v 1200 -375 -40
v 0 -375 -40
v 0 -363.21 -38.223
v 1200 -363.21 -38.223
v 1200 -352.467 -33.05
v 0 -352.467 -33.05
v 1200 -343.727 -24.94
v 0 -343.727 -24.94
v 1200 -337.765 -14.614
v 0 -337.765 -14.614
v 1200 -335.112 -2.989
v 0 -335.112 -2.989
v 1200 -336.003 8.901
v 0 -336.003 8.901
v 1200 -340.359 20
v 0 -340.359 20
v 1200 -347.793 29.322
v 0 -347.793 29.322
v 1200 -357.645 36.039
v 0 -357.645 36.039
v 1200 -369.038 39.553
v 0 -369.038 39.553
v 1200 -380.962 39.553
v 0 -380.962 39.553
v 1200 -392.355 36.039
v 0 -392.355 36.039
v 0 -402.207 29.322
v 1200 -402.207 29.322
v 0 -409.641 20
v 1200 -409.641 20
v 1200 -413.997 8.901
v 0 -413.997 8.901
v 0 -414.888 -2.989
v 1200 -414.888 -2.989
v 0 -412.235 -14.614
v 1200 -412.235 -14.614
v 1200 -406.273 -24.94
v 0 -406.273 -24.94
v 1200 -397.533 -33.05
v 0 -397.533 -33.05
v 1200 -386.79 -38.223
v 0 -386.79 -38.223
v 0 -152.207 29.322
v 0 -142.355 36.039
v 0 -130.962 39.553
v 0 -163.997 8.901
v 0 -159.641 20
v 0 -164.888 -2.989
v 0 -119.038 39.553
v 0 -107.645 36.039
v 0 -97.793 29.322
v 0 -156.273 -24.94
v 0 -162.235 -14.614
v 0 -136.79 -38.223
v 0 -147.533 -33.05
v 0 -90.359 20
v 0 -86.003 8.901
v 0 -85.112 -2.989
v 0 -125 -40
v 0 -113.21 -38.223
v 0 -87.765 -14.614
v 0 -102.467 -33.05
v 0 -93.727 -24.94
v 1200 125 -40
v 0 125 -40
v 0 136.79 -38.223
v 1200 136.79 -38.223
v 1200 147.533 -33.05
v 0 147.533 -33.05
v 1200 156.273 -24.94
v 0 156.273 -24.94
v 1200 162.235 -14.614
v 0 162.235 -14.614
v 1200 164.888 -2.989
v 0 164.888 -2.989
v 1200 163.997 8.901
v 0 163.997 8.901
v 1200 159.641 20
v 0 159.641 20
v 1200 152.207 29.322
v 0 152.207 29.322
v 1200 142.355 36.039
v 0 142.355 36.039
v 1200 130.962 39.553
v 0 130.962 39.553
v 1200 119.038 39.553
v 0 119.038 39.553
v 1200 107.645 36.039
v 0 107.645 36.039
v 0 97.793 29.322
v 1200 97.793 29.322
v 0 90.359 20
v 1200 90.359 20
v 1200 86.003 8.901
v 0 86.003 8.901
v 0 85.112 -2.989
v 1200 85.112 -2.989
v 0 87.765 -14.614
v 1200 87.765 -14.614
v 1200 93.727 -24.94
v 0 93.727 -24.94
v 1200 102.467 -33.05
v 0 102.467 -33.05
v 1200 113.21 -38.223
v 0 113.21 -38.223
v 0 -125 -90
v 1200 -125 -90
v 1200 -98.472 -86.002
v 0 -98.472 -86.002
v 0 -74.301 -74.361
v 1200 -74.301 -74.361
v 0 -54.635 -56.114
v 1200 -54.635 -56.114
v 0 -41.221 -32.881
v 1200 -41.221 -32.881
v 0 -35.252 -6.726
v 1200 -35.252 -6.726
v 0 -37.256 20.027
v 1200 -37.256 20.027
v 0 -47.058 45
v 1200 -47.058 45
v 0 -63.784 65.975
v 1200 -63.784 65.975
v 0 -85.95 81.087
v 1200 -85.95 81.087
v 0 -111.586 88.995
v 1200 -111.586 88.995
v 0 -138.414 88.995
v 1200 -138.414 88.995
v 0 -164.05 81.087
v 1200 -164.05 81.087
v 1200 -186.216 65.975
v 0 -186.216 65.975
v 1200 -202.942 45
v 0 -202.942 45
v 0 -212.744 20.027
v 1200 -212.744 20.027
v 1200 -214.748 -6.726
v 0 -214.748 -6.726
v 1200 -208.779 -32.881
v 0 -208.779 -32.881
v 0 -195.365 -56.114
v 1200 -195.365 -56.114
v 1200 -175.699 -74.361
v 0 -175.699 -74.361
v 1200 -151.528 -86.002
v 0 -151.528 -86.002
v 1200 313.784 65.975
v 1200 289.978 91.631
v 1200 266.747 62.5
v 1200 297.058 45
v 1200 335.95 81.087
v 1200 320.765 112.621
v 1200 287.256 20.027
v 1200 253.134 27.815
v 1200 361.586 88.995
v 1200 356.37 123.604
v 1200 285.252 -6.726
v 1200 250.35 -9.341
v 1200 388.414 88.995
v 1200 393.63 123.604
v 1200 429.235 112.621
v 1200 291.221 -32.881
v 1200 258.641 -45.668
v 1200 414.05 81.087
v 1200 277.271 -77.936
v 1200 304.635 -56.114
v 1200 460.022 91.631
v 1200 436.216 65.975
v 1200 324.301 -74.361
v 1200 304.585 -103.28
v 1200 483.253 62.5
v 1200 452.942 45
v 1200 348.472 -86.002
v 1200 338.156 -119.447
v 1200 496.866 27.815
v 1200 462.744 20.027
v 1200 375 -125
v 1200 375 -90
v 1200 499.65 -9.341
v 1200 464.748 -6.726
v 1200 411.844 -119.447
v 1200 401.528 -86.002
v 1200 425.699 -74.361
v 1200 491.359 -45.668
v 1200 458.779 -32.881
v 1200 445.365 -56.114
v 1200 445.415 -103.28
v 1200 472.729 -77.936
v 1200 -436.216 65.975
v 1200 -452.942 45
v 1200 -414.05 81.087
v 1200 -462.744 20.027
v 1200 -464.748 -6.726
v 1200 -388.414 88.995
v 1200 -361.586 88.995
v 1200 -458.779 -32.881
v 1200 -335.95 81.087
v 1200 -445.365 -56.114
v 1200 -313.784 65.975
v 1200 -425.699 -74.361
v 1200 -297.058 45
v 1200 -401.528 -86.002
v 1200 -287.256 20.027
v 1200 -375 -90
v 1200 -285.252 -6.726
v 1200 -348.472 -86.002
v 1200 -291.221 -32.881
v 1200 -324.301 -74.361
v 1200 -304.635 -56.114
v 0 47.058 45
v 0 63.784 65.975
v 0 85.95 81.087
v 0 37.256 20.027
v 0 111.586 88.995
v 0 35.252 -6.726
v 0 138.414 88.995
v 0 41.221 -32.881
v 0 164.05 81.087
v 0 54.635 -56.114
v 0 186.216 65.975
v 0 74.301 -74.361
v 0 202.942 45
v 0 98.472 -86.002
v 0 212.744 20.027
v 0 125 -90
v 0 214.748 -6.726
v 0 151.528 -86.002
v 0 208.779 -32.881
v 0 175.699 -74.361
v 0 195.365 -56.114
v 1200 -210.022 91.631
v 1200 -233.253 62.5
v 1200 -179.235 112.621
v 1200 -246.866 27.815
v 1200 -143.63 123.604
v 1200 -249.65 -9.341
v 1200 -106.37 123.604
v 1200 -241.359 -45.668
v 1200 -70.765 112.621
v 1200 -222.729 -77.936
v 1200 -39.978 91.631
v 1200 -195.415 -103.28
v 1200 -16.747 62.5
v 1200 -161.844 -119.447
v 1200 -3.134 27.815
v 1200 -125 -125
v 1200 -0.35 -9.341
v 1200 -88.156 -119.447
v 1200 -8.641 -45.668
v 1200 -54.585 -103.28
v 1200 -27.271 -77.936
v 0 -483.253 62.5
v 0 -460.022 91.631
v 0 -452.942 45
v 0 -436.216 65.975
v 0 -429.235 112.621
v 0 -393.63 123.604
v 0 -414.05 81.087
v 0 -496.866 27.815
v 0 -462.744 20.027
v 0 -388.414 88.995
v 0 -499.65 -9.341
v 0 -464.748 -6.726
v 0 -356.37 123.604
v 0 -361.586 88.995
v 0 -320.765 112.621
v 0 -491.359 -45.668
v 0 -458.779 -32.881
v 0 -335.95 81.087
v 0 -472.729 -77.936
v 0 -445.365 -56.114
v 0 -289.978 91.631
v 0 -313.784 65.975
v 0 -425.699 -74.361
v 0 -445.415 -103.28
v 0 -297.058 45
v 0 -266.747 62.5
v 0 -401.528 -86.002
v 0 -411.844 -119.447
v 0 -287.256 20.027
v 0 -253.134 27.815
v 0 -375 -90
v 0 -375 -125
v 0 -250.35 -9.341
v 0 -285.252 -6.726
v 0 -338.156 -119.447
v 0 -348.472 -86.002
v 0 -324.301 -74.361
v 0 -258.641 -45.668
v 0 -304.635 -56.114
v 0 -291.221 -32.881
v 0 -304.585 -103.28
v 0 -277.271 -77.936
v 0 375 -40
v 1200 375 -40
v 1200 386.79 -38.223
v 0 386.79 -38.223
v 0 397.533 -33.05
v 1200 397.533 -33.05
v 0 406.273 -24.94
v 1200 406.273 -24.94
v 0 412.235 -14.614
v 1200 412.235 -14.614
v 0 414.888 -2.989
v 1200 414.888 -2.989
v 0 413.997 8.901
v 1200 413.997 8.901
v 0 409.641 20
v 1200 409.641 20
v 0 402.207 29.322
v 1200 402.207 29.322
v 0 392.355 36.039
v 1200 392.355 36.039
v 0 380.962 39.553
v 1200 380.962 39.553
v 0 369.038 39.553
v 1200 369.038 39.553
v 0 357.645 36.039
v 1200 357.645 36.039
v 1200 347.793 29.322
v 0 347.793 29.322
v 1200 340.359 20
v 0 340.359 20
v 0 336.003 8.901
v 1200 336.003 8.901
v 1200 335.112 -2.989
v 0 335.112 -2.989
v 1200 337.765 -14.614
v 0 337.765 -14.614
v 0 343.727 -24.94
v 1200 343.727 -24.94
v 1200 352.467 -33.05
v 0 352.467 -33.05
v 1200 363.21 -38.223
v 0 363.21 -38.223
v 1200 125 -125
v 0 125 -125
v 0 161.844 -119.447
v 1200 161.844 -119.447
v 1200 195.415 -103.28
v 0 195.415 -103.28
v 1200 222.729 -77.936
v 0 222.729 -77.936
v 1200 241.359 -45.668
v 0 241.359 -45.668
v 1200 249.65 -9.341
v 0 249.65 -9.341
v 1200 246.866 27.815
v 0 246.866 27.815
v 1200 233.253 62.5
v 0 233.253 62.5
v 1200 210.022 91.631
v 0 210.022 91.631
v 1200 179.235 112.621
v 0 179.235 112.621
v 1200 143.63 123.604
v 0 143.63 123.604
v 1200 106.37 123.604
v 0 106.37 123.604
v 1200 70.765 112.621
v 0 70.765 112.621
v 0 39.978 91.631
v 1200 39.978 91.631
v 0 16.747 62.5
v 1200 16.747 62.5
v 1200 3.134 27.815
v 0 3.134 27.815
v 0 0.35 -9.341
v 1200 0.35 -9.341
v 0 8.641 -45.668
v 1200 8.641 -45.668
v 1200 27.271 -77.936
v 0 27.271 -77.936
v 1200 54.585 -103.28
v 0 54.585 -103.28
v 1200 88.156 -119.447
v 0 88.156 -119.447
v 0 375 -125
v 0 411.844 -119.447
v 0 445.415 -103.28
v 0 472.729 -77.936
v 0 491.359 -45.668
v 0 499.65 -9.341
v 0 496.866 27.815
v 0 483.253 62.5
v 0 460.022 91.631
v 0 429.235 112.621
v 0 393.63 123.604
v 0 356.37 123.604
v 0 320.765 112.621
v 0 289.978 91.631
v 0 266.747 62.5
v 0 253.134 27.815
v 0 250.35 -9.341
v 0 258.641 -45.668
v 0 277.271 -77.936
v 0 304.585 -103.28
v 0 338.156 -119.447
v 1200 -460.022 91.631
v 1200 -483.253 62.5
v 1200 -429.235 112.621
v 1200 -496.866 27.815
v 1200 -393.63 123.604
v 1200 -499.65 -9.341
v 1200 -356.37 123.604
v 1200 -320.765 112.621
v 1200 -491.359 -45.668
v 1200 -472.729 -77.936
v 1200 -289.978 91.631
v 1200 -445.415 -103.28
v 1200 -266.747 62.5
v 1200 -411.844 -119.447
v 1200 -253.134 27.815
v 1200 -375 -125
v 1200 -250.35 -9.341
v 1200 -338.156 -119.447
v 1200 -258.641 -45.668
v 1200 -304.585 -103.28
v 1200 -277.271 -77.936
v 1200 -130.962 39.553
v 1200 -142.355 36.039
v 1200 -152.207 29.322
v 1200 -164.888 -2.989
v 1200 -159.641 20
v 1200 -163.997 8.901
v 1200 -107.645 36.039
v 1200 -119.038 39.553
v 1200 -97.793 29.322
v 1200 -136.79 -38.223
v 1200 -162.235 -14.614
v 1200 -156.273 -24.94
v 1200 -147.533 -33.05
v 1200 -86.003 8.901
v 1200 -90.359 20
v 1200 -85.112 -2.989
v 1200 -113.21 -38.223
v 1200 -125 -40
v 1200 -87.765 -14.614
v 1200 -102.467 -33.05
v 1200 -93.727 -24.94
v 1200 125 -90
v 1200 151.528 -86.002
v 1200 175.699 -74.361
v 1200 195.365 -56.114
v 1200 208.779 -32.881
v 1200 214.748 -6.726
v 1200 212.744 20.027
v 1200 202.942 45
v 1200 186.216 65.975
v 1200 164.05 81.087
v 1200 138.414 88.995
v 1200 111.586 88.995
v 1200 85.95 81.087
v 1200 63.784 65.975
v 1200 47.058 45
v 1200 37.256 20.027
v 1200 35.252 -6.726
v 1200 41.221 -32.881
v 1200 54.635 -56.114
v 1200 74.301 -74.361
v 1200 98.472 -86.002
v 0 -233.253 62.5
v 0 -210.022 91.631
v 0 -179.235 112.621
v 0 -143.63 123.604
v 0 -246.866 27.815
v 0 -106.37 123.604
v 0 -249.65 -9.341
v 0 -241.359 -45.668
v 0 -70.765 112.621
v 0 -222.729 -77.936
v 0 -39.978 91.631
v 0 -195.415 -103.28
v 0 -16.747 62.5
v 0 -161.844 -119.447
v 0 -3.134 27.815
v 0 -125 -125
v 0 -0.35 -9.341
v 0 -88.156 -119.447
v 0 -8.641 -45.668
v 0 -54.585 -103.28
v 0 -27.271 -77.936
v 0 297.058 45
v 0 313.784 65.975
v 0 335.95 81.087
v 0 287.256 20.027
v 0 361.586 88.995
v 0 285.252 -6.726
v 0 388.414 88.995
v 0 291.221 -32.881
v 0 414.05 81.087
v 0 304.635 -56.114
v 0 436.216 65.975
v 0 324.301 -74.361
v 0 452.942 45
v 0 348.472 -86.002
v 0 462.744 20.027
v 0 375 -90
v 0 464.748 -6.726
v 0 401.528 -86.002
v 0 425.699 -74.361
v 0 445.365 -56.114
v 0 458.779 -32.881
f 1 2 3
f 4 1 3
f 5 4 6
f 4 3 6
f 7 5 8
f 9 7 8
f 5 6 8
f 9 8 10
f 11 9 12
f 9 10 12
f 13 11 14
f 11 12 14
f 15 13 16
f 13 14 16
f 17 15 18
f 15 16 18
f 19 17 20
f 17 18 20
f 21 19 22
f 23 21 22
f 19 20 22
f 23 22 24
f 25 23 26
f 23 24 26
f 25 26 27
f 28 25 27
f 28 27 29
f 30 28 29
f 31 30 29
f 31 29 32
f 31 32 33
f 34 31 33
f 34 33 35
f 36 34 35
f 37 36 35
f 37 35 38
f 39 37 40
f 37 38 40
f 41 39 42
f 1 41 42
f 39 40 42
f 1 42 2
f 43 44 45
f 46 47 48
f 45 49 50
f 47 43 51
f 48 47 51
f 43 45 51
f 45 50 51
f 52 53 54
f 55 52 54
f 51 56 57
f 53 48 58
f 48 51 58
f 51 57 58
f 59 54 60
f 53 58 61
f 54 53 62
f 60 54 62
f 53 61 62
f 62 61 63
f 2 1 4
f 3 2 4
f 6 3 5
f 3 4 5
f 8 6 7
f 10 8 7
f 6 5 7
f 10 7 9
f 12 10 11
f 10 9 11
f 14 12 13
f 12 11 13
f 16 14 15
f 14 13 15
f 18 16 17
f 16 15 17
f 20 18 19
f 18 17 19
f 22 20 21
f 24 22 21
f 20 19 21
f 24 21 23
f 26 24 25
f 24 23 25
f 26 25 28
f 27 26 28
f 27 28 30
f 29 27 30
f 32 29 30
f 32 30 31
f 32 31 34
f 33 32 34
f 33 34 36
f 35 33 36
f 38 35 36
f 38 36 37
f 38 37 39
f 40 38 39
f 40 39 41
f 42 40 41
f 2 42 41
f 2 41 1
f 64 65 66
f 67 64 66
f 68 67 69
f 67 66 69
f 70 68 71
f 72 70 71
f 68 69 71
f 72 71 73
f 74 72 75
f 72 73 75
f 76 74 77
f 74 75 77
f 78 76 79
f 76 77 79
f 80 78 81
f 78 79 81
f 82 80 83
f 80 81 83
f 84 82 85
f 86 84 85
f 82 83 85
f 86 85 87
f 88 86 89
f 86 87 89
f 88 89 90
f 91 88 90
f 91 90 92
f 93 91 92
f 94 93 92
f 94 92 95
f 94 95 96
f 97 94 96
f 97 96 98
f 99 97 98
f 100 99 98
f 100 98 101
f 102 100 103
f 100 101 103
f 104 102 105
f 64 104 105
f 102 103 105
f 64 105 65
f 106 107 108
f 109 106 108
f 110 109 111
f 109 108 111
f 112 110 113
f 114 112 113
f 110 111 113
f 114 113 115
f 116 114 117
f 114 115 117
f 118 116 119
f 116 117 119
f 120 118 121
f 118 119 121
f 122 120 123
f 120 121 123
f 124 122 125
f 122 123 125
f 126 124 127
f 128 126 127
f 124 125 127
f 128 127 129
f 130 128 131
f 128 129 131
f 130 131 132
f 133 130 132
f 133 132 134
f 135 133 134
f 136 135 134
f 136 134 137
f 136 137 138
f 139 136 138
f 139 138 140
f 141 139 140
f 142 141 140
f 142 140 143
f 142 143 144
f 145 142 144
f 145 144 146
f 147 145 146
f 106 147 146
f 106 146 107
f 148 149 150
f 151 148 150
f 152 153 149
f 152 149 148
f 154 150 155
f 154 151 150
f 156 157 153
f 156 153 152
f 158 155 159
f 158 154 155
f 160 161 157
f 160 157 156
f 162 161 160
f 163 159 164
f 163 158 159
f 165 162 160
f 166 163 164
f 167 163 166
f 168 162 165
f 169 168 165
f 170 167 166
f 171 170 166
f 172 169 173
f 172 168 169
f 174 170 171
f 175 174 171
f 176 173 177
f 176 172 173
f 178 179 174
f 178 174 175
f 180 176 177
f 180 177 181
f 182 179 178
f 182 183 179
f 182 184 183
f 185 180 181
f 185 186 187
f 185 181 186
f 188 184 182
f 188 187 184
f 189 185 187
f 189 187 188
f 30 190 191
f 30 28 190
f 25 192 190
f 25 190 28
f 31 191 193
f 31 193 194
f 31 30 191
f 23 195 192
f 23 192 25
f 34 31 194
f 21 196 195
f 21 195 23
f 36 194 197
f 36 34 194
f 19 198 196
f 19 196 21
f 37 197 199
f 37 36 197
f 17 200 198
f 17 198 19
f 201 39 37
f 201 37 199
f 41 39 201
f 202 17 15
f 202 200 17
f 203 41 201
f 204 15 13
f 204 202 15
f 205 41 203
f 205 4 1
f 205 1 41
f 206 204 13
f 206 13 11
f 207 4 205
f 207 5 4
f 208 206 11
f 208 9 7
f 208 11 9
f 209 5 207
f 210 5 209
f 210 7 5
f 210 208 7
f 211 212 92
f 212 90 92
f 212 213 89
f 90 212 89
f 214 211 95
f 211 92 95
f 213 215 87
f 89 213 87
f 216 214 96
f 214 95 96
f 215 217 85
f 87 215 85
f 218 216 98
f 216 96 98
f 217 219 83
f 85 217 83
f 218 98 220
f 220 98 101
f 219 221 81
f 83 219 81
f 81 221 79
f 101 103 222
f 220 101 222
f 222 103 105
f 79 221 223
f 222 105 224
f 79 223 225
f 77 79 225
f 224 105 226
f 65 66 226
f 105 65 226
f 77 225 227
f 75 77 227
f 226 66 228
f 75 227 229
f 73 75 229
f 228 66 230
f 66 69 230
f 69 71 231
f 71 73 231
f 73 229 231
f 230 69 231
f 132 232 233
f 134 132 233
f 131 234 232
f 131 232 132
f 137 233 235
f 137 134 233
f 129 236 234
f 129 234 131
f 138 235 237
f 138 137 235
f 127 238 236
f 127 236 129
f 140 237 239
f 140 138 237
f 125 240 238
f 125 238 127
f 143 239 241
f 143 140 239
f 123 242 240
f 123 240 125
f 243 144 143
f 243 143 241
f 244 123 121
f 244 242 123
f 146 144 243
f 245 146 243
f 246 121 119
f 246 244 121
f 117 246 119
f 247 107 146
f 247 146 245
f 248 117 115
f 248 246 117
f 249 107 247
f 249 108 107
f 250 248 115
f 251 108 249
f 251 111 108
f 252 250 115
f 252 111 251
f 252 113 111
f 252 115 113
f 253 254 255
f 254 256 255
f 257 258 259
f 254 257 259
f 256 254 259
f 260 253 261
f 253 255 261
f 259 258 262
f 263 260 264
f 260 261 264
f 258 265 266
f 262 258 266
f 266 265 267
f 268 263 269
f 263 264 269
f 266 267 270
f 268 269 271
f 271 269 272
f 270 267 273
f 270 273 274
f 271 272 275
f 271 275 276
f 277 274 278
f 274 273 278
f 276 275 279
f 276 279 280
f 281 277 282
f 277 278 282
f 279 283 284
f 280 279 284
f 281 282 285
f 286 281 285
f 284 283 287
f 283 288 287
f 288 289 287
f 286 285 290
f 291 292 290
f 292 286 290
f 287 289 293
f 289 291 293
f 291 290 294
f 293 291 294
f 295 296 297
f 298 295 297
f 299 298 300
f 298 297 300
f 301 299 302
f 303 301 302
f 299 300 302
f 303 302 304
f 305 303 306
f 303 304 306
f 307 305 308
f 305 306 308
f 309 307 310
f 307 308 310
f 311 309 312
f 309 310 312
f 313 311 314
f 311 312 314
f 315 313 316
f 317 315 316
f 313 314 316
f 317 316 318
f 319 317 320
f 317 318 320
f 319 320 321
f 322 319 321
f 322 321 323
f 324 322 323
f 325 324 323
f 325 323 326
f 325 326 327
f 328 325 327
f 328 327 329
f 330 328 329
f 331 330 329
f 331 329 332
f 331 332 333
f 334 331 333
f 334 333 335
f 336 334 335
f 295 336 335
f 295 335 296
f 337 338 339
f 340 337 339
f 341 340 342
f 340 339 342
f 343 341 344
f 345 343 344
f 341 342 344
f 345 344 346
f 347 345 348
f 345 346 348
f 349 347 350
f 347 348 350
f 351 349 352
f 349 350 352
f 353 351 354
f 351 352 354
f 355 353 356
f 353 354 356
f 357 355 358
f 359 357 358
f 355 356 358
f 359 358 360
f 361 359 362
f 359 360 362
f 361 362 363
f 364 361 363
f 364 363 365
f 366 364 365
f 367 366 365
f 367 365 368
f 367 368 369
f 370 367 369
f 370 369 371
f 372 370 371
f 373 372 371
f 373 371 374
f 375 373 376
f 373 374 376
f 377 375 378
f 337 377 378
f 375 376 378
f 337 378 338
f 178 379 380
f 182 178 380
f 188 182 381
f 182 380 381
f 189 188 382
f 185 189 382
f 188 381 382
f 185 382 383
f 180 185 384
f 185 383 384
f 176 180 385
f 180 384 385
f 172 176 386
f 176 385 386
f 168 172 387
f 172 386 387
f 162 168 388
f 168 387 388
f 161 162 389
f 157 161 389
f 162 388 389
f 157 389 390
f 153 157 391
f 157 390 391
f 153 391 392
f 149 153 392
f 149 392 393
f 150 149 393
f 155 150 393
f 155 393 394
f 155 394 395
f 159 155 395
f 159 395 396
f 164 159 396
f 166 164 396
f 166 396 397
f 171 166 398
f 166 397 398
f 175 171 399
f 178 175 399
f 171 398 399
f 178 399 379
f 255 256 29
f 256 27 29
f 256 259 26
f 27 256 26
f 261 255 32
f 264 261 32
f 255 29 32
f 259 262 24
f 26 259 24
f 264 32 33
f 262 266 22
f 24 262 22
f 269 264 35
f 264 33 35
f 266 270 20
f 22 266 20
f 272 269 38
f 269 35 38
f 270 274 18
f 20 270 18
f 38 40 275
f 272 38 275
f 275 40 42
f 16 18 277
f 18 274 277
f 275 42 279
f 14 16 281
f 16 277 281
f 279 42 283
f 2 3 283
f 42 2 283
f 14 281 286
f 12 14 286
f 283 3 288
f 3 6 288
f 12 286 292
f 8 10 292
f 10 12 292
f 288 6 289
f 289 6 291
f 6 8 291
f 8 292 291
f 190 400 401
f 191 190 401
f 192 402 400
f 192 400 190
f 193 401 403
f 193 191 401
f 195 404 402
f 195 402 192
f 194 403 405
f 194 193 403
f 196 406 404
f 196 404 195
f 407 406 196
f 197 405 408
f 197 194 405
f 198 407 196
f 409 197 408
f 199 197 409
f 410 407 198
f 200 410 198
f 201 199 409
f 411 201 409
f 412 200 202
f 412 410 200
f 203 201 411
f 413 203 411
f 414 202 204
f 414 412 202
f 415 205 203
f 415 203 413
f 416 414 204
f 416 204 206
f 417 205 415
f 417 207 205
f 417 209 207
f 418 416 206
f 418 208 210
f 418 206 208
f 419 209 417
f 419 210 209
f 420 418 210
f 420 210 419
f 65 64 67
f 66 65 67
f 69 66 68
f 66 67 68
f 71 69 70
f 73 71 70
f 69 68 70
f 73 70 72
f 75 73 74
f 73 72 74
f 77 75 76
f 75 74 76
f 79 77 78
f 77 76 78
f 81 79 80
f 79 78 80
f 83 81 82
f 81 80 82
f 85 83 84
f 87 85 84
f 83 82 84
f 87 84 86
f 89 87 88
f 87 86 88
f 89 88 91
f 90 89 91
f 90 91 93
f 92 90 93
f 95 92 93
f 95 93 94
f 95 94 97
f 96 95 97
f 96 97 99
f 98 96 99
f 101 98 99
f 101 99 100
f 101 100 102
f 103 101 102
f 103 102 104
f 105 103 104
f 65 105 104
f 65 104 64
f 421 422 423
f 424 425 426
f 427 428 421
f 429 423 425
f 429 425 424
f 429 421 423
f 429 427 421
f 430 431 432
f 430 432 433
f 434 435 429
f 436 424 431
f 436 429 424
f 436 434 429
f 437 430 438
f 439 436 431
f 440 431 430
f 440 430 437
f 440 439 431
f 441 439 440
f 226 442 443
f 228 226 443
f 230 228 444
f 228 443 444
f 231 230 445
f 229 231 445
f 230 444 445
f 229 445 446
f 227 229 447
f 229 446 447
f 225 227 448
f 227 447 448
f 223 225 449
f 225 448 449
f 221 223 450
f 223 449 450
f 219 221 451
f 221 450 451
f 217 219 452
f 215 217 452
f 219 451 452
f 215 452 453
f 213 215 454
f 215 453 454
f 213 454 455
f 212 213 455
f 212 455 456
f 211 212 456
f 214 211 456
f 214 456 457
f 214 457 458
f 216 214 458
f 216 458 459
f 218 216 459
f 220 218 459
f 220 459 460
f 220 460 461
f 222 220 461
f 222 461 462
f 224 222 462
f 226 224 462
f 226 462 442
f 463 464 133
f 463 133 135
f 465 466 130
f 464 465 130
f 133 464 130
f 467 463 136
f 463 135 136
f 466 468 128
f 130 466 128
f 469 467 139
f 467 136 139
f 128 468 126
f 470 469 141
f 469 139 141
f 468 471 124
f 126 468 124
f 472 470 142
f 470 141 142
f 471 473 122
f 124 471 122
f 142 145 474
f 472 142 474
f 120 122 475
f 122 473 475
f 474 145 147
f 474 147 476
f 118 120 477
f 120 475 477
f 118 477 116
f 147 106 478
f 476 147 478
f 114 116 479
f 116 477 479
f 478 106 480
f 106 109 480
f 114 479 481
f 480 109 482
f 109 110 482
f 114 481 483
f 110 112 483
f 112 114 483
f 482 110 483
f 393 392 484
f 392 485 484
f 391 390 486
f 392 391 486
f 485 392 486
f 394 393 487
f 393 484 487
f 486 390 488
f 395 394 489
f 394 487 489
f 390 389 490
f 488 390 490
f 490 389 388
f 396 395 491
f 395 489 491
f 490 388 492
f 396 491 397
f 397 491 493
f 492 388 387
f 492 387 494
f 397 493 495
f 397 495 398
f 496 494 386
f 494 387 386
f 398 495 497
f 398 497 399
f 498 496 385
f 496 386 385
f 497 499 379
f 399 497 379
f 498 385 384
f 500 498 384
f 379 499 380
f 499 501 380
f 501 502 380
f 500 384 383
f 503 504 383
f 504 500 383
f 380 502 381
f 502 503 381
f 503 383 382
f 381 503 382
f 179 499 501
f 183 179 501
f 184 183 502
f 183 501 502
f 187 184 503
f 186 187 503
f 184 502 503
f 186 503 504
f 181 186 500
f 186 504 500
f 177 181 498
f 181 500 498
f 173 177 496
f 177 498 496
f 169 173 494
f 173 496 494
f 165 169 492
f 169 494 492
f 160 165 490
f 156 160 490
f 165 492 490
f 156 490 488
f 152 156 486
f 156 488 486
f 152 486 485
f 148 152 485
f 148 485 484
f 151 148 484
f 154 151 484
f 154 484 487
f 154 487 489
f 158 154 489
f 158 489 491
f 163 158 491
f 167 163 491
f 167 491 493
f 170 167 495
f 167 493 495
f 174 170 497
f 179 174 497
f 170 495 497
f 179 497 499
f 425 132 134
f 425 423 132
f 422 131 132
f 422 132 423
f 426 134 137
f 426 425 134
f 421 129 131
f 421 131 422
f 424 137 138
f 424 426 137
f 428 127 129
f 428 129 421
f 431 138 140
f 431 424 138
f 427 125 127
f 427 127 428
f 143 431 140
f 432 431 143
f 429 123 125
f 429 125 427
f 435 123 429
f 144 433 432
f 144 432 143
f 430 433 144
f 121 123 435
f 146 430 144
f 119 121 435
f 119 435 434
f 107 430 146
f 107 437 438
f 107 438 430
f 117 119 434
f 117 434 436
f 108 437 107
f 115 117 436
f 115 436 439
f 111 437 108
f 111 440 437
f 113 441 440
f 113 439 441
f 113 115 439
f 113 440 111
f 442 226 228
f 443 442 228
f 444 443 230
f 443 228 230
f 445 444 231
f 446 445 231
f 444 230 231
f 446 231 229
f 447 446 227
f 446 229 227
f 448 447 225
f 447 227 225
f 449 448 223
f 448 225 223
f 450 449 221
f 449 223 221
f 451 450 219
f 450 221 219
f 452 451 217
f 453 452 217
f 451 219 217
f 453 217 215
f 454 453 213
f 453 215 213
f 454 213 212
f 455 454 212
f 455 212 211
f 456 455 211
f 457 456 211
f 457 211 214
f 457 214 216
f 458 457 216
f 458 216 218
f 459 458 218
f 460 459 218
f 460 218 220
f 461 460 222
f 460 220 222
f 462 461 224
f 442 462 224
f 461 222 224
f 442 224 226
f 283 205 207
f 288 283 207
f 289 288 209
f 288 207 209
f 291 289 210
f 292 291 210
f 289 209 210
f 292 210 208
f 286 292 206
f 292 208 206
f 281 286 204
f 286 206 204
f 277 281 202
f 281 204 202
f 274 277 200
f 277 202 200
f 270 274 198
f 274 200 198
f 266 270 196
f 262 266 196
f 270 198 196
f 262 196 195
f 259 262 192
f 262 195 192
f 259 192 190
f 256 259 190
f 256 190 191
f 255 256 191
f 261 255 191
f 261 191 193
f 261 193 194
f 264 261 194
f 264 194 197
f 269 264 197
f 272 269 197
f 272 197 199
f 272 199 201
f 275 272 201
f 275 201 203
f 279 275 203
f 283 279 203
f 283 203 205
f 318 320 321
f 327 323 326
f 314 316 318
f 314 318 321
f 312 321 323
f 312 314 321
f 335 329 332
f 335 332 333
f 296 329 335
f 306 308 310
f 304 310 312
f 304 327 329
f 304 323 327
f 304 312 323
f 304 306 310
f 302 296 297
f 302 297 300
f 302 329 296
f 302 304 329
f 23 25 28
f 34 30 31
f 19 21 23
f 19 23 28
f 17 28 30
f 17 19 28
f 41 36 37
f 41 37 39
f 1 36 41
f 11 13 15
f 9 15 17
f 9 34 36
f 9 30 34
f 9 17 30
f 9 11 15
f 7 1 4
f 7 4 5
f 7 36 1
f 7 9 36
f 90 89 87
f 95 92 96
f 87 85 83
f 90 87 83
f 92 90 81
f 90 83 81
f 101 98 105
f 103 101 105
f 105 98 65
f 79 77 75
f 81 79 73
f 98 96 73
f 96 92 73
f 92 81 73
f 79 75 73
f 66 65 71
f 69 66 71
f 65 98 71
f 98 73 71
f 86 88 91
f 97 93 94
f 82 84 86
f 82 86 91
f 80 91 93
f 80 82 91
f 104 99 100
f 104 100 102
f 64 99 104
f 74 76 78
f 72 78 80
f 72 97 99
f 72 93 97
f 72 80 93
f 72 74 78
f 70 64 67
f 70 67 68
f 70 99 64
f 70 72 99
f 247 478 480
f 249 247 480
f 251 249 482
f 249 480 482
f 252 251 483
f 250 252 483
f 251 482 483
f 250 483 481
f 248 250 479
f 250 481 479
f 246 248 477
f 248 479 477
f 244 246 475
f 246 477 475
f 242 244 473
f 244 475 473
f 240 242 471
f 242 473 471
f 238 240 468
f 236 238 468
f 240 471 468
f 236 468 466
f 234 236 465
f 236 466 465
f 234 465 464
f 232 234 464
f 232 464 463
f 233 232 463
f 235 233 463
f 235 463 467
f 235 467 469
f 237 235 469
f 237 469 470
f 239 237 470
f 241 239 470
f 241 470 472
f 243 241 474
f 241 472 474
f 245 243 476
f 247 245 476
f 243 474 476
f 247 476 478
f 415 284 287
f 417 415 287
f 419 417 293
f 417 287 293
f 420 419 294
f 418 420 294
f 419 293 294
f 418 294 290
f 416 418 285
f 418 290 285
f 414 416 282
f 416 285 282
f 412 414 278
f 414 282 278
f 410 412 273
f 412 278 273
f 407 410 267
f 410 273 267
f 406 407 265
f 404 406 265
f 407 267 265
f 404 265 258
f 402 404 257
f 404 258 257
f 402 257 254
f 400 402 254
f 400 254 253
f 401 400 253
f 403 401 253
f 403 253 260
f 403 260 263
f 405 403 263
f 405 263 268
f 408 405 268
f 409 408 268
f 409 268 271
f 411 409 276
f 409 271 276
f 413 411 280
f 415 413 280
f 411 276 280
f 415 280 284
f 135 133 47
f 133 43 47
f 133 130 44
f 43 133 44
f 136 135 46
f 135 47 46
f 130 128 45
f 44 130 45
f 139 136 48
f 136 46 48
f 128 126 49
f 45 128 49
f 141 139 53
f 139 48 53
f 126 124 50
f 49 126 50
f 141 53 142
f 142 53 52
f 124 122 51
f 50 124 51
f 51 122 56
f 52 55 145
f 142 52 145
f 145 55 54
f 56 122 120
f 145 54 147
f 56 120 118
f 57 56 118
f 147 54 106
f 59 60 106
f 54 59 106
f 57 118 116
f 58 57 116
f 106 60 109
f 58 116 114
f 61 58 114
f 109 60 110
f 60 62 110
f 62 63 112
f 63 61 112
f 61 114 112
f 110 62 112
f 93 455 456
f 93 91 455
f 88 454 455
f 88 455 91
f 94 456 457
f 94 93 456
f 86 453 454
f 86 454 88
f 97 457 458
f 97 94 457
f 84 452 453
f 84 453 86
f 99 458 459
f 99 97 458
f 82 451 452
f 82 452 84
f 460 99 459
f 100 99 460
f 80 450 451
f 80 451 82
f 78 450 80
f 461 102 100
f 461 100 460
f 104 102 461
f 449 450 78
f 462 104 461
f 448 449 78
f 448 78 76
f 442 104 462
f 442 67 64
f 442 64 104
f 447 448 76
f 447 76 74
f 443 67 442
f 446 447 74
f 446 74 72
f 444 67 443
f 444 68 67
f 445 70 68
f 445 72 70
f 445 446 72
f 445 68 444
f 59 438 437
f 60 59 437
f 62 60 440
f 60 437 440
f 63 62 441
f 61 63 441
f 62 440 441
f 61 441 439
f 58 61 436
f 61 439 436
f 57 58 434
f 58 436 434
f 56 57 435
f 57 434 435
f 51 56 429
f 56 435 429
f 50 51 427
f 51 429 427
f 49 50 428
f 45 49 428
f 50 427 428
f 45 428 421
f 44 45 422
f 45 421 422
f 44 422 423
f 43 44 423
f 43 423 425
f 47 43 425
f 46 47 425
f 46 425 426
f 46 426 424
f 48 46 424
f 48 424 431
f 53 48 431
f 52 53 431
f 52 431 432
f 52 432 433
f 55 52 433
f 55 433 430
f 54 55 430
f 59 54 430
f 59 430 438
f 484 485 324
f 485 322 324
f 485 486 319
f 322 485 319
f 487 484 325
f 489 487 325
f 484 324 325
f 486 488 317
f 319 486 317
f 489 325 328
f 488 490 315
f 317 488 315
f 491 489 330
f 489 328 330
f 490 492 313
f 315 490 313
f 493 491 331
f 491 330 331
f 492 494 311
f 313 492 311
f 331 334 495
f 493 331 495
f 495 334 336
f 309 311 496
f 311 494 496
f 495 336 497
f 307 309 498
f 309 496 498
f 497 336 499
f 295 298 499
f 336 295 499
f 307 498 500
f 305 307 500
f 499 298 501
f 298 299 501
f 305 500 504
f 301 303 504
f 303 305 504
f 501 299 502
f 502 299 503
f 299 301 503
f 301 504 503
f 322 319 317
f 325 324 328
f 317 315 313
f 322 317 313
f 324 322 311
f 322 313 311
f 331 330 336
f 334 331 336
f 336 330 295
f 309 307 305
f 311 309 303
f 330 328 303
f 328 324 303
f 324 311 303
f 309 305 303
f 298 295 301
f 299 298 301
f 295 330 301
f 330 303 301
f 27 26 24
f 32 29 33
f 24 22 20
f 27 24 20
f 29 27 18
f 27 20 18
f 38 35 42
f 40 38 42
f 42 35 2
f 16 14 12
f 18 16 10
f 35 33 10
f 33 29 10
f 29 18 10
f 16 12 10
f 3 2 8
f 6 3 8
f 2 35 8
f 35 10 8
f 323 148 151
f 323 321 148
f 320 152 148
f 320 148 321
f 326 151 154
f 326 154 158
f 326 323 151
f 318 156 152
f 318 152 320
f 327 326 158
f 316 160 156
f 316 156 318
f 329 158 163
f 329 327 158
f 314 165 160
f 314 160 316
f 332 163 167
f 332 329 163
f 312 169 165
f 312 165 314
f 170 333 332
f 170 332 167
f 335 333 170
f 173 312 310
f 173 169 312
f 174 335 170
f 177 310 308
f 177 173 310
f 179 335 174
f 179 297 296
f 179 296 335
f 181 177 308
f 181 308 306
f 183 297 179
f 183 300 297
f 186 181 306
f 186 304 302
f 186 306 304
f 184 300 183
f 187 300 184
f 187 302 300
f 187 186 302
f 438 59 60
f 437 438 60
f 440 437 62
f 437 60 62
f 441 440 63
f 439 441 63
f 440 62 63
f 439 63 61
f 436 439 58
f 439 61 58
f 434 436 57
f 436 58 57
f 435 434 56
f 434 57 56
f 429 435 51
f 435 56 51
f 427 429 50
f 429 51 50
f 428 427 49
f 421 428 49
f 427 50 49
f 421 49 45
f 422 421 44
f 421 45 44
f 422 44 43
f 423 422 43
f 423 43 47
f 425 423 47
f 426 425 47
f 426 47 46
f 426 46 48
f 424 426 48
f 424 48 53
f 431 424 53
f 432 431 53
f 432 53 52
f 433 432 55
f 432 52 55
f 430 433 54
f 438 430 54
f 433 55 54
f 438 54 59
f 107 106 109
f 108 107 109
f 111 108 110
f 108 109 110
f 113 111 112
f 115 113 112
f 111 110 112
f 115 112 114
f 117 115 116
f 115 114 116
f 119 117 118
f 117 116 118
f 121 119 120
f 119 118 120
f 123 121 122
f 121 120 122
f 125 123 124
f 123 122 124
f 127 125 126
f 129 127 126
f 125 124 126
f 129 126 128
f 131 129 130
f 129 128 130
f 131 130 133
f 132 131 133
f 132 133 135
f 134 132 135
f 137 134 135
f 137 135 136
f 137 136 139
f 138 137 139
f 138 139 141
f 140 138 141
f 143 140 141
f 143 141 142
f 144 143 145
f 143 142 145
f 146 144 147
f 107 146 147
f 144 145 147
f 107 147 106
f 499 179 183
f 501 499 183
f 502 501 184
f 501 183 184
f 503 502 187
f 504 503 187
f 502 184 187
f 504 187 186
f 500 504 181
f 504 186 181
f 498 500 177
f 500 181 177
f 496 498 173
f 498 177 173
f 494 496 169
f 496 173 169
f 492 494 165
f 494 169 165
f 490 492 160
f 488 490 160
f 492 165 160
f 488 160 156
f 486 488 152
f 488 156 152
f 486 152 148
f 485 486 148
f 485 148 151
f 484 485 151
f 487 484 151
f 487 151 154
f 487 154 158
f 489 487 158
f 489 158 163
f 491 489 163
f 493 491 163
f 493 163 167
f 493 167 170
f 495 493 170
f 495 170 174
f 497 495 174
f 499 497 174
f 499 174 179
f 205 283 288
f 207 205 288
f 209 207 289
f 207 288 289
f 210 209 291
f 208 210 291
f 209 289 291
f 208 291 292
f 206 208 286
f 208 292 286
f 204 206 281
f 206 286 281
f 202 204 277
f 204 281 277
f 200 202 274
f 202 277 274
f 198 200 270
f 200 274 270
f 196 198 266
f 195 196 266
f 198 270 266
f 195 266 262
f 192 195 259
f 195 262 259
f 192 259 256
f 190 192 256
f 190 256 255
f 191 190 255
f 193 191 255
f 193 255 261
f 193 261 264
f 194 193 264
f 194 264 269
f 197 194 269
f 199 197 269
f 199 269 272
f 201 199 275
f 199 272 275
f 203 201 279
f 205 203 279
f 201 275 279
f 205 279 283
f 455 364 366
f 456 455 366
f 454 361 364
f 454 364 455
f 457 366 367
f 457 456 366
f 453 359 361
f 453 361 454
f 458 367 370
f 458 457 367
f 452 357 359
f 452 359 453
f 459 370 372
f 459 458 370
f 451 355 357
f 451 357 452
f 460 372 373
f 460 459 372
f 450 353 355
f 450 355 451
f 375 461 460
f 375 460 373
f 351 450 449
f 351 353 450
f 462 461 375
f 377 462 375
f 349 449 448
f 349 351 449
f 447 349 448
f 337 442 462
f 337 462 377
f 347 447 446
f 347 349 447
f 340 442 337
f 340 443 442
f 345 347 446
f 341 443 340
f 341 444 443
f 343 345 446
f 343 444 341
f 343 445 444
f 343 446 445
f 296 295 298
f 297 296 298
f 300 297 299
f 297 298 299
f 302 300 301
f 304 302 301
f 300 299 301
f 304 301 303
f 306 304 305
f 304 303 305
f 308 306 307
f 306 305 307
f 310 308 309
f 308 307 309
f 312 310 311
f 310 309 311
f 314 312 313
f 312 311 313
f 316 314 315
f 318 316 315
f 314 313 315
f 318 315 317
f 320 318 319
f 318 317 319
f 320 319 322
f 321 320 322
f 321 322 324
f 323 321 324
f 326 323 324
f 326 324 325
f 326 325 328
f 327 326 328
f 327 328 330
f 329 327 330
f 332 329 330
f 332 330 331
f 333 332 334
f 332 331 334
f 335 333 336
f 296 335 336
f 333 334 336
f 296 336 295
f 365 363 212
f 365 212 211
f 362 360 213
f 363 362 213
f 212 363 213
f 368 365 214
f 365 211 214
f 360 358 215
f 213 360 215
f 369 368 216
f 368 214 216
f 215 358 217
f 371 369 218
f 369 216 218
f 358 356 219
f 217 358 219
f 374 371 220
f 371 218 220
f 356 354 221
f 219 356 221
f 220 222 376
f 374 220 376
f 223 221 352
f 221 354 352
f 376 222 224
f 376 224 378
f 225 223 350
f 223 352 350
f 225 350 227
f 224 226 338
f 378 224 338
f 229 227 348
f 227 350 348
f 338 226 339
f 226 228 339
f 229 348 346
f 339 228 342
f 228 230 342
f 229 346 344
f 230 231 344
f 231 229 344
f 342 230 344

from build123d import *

# Parameters (mm, degrees)
SKETCH_1_R          = 125
EXTRUDE_1_DEPTH     = 1200
EXTRUDE_1_2_DEPTH   = 1200
EXTRUDE_1_3_DEPTH   = 1200
EXTRUDE_1_4_DEPTH   = 1200
SKETCH_2_R          = 90
CUT_EXTRUDE_1_DEPTH = 1306.995788661
SKETCH_3_R          = 90
EXTRUDE_3_DEPTH     = 1200
EXTRUDE_3_2_DEPTH   = 1200
EXTRUDE_3_3_DEPTH   = 1200
EXTRUDE_3_4_DEPTH   = 1200
SKETCH_4_R          = 40
CUT_EXTRUDE_2_DEPTH = 1306.995788661
SKETCH_5_R          = 40
EXTRUDE_7_DEPTH     = 1200
EXTRUDE_7_2_DEPTH   = 1200
EXTRUDE_7_3_DEPTH   = 1200
EXTRUDE_7_4_DEPTH   = 1200


with BuildPart() as part:
    # 草图1 → 凸台-拉伸1 (new body)
    with BuildSketch(Plane(origin=(0, 0, 0), x_dir=(0, 0, -1), z_dir=(1, 0, 0))):
        with Locations((0, -375)):
            Circle(SKETCH_1_R)
    extrude(amount=EXTRUDE_1_DEPTH)


with BuildPart() as body_2:
    # 草图1 → Extrude 1 2 (new body)
    with BuildSketch(Plane(origin=(0, 0, 0), x_dir=(0, 0, -1), z_dir=(1, 0, 0))):
        with Locations((0, 375)):
            Circle(SKETCH_1_R)
    extrude(amount=EXTRUDE_1_2_DEPTH)


with BuildPart() as body_3:
    # 草图1 → Extrude 1 3 (new body)
    with BuildSketch(Plane(origin=(0, 0, 0), x_dir=(0, 0, -1), z_dir=(1, 0, 0))):
        with Locations((0, 125)):
            Circle(SKETCH_1_R)
    extrude(amount=EXTRUDE_1_3_DEPTH)


with BuildPart() as body_4:
    # 草图1 → Extrude 1 4 (new body)
    with BuildSketch(Plane(origin=(0, 0, 0), x_dir=(0, 0, -1), z_dir=(1, 0, 0))):
        with Locations((0, -125)):
            Circle(SKETCH_1_R)
    extrude(amount=EXTRUDE_1_4_DEPTH)


with BuildPart() as cut_extrude_1_tool:
    # 草图2 → 切除-拉伸1 (new, through all)
    with BuildSketch(Plane(origin=(1200, 0, 0), x_dir=(0, 0, -1), z_dir=(1, 0, 0))):
        with Locations((0, 375)):
            Circle(SKETCH_2_R)
        with Locations((0, 125)):
            Circle(SKETCH_2_R)
        with Locations((0, -125)):
            Circle(SKETCH_2_R)
        with Locations((0, -375)):
            Circle(SKETCH_2_R)
    extrude(amount=-CUT_EXTRUDE_1_DEPTH)


with BuildPart() as part_1:
    add(part.part)

    # 切除-拉伸1: cut by cut_extrude_1_tool
    add(cut_extrude_1_tool.part, mode=Mode.SUBTRACT)


with BuildPart() as body_2_1:
    add(body_2.part)

    # 切除-拉伸1: cut by cut_extrude_1_tool
    add(cut_extrude_1_tool.part, mode=Mode.SUBTRACT)


with BuildPart() as body_3_1:
    add(body_3.part)

    # 切除-拉伸1: cut by cut_extrude_1_tool
    add(cut_extrude_1_tool.part, mode=Mode.SUBTRACT)


with BuildPart() as body_4_1:
    add(body_4.part)

    # 切除-拉伸1: cut by cut_extrude_1_tool
    add(cut_extrude_1_tool.part, mode=Mode.SUBTRACT)


with BuildPart() as body_5:
    # 草图3 → 凸台-拉伸3 (new body)
    with BuildSketch(Plane(origin=(0, 0, 0), x_dir=(0, 0, -1), z_dir=(1, 0, 0))):
        with Locations((0, 375)):
            Circle(SKETCH_3_R)
    extrude(amount=EXTRUDE_3_DEPTH)


with BuildPart() as body_6:
    # 草图3 → Extrude 3 2 (new body)
    with BuildSketch(Plane(origin=(0, 0, 0), x_dir=(0, 0, -1), z_dir=(1, 0, 0))):
        with Locations((0, 125)):
            Circle(SKETCH_3_R)
    extrude(amount=EXTRUDE_3_2_DEPTH)


with BuildPart() as body_7:
    # 草图3 → Extrude 3 3 (new body)
    with BuildSketch(Plane(origin=(0, 0, 0), x_dir=(0, 0, -1), z_dir=(1, 0, 0))):
        with Locations((0, -125)):
            Circle(SKETCH_3_R)
    extrude(amount=EXTRUDE_3_3_DEPTH)


with BuildPart() as body_8:
    # 草图3 → Extrude 3 4 (new body)
    with BuildSketch(Plane(origin=(0, 0, 0), x_dir=(0, 0, -1), z_dir=(1, 0, 0))):
        with Locations((0, -375)):
            Circle(SKETCH_3_R)
    extrude(amount=EXTRUDE_3_4_DEPTH)


with BuildPart() as cut_extrude_2_tool:
    # 草图4 → 切除-拉伸2 (new, through all)
    with BuildSketch(Plane(origin=(1200, 0, 0), x_dir=(0, 0, -1), z_dir=(1, 0, 0))):
        with Locations((0, 375)):
            Circle(SKETCH_4_R)
        with Locations((0, 125)):
            Circle(SKETCH_4_R)
        with Locations((0, -125)):
            Circle(SKETCH_4_R)
        with Locations((0, -375)):
            Circle(SKETCH_4_R)
    extrude(amount=-CUT_EXTRUDE_2_DEPTH)


with BuildPart() as body_5_1:
    add(body_5.part)

    # 切除-拉伸2: cut by cut_extrude_2_tool
    add(cut_extrude_2_tool.part, mode=Mode.SUBTRACT)


with BuildPart() as body_6_1:
    add(body_6.part)

    # 切除-拉伸2: cut by cut_extrude_2_tool
    add(cut_extrude_2_tool.part, mode=Mode.SUBTRACT)


with BuildPart() as body_7_1:
    add(body_7.part)

    # 切除-拉伸2: cut by cut_extrude_2_tool
    add(cut_extrude_2_tool.part, mode=Mode.SUBTRACT)


with BuildPart() as body_8_1:
    add(body_8.part)

    # 切除-拉伸2: cut by cut_extrude_2_tool
    add(cut_extrude_2_tool.part, mode=Mode.SUBTRACT)


with BuildPart() as body_9:
    # 草图5 → 凸台-拉伸7 (new body)
    with BuildSketch(Plane(origin=(0, 0, 0), x_dir=(0, 0, -1), z_dir=(1, 0, 0))):
        with Locations((0, 375)):
            Circle(SKETCH_5_R)
    extrude(amount=EXTRUDE_7_DEPTH)


with BuildPart() as body_10:
    # 草图5 → Extrude 7 2 (new body)
    with BuildSketch(Plane(origin=(0, 0, 0), x_dir=(0, 0, -1), z_dir=(1, 0, 0))):
        with Locations((0, 125)):
            Circle(SKETCH_5_R)
    extrude(amount=EXTRUDE_7_2_DEPTH)


with BuildPart() as body_11:
    # 草图5 → Extrude 7 3 (new body)
    with BuildSketch(Plane(origin=(0, 0, 0), x_dir=(0, 0, -1), z_dir=(1, 0, 0))):
        with Locations((0, -125)):
            Circle(SKETCH_5_R)
    extrude(amount=EXTRUDE_7_3_DEPTH)


with BuildPart() as body_12:
    # 草图5 → Extrude 7 4 (new body)
    with BuildSketch(Plane(origin=(0, 0, 0), x_dir=(0, 0, -1), z_dir=(1, 0, 0))):
        with Locations((0, -375)):
            Circle(SKETCH_5_R)
    extrude(amount=EXTRUDE_7_4_DEPTH)


solid = Compound([part_1.part, body_2_1.part, body_3_1.part, body_4_1.part, body_5_1.part, body_6_1.part, body_7_1.part, body_8_1.part, body_9.part, body_10.part, body_11.part, body_12.part])
